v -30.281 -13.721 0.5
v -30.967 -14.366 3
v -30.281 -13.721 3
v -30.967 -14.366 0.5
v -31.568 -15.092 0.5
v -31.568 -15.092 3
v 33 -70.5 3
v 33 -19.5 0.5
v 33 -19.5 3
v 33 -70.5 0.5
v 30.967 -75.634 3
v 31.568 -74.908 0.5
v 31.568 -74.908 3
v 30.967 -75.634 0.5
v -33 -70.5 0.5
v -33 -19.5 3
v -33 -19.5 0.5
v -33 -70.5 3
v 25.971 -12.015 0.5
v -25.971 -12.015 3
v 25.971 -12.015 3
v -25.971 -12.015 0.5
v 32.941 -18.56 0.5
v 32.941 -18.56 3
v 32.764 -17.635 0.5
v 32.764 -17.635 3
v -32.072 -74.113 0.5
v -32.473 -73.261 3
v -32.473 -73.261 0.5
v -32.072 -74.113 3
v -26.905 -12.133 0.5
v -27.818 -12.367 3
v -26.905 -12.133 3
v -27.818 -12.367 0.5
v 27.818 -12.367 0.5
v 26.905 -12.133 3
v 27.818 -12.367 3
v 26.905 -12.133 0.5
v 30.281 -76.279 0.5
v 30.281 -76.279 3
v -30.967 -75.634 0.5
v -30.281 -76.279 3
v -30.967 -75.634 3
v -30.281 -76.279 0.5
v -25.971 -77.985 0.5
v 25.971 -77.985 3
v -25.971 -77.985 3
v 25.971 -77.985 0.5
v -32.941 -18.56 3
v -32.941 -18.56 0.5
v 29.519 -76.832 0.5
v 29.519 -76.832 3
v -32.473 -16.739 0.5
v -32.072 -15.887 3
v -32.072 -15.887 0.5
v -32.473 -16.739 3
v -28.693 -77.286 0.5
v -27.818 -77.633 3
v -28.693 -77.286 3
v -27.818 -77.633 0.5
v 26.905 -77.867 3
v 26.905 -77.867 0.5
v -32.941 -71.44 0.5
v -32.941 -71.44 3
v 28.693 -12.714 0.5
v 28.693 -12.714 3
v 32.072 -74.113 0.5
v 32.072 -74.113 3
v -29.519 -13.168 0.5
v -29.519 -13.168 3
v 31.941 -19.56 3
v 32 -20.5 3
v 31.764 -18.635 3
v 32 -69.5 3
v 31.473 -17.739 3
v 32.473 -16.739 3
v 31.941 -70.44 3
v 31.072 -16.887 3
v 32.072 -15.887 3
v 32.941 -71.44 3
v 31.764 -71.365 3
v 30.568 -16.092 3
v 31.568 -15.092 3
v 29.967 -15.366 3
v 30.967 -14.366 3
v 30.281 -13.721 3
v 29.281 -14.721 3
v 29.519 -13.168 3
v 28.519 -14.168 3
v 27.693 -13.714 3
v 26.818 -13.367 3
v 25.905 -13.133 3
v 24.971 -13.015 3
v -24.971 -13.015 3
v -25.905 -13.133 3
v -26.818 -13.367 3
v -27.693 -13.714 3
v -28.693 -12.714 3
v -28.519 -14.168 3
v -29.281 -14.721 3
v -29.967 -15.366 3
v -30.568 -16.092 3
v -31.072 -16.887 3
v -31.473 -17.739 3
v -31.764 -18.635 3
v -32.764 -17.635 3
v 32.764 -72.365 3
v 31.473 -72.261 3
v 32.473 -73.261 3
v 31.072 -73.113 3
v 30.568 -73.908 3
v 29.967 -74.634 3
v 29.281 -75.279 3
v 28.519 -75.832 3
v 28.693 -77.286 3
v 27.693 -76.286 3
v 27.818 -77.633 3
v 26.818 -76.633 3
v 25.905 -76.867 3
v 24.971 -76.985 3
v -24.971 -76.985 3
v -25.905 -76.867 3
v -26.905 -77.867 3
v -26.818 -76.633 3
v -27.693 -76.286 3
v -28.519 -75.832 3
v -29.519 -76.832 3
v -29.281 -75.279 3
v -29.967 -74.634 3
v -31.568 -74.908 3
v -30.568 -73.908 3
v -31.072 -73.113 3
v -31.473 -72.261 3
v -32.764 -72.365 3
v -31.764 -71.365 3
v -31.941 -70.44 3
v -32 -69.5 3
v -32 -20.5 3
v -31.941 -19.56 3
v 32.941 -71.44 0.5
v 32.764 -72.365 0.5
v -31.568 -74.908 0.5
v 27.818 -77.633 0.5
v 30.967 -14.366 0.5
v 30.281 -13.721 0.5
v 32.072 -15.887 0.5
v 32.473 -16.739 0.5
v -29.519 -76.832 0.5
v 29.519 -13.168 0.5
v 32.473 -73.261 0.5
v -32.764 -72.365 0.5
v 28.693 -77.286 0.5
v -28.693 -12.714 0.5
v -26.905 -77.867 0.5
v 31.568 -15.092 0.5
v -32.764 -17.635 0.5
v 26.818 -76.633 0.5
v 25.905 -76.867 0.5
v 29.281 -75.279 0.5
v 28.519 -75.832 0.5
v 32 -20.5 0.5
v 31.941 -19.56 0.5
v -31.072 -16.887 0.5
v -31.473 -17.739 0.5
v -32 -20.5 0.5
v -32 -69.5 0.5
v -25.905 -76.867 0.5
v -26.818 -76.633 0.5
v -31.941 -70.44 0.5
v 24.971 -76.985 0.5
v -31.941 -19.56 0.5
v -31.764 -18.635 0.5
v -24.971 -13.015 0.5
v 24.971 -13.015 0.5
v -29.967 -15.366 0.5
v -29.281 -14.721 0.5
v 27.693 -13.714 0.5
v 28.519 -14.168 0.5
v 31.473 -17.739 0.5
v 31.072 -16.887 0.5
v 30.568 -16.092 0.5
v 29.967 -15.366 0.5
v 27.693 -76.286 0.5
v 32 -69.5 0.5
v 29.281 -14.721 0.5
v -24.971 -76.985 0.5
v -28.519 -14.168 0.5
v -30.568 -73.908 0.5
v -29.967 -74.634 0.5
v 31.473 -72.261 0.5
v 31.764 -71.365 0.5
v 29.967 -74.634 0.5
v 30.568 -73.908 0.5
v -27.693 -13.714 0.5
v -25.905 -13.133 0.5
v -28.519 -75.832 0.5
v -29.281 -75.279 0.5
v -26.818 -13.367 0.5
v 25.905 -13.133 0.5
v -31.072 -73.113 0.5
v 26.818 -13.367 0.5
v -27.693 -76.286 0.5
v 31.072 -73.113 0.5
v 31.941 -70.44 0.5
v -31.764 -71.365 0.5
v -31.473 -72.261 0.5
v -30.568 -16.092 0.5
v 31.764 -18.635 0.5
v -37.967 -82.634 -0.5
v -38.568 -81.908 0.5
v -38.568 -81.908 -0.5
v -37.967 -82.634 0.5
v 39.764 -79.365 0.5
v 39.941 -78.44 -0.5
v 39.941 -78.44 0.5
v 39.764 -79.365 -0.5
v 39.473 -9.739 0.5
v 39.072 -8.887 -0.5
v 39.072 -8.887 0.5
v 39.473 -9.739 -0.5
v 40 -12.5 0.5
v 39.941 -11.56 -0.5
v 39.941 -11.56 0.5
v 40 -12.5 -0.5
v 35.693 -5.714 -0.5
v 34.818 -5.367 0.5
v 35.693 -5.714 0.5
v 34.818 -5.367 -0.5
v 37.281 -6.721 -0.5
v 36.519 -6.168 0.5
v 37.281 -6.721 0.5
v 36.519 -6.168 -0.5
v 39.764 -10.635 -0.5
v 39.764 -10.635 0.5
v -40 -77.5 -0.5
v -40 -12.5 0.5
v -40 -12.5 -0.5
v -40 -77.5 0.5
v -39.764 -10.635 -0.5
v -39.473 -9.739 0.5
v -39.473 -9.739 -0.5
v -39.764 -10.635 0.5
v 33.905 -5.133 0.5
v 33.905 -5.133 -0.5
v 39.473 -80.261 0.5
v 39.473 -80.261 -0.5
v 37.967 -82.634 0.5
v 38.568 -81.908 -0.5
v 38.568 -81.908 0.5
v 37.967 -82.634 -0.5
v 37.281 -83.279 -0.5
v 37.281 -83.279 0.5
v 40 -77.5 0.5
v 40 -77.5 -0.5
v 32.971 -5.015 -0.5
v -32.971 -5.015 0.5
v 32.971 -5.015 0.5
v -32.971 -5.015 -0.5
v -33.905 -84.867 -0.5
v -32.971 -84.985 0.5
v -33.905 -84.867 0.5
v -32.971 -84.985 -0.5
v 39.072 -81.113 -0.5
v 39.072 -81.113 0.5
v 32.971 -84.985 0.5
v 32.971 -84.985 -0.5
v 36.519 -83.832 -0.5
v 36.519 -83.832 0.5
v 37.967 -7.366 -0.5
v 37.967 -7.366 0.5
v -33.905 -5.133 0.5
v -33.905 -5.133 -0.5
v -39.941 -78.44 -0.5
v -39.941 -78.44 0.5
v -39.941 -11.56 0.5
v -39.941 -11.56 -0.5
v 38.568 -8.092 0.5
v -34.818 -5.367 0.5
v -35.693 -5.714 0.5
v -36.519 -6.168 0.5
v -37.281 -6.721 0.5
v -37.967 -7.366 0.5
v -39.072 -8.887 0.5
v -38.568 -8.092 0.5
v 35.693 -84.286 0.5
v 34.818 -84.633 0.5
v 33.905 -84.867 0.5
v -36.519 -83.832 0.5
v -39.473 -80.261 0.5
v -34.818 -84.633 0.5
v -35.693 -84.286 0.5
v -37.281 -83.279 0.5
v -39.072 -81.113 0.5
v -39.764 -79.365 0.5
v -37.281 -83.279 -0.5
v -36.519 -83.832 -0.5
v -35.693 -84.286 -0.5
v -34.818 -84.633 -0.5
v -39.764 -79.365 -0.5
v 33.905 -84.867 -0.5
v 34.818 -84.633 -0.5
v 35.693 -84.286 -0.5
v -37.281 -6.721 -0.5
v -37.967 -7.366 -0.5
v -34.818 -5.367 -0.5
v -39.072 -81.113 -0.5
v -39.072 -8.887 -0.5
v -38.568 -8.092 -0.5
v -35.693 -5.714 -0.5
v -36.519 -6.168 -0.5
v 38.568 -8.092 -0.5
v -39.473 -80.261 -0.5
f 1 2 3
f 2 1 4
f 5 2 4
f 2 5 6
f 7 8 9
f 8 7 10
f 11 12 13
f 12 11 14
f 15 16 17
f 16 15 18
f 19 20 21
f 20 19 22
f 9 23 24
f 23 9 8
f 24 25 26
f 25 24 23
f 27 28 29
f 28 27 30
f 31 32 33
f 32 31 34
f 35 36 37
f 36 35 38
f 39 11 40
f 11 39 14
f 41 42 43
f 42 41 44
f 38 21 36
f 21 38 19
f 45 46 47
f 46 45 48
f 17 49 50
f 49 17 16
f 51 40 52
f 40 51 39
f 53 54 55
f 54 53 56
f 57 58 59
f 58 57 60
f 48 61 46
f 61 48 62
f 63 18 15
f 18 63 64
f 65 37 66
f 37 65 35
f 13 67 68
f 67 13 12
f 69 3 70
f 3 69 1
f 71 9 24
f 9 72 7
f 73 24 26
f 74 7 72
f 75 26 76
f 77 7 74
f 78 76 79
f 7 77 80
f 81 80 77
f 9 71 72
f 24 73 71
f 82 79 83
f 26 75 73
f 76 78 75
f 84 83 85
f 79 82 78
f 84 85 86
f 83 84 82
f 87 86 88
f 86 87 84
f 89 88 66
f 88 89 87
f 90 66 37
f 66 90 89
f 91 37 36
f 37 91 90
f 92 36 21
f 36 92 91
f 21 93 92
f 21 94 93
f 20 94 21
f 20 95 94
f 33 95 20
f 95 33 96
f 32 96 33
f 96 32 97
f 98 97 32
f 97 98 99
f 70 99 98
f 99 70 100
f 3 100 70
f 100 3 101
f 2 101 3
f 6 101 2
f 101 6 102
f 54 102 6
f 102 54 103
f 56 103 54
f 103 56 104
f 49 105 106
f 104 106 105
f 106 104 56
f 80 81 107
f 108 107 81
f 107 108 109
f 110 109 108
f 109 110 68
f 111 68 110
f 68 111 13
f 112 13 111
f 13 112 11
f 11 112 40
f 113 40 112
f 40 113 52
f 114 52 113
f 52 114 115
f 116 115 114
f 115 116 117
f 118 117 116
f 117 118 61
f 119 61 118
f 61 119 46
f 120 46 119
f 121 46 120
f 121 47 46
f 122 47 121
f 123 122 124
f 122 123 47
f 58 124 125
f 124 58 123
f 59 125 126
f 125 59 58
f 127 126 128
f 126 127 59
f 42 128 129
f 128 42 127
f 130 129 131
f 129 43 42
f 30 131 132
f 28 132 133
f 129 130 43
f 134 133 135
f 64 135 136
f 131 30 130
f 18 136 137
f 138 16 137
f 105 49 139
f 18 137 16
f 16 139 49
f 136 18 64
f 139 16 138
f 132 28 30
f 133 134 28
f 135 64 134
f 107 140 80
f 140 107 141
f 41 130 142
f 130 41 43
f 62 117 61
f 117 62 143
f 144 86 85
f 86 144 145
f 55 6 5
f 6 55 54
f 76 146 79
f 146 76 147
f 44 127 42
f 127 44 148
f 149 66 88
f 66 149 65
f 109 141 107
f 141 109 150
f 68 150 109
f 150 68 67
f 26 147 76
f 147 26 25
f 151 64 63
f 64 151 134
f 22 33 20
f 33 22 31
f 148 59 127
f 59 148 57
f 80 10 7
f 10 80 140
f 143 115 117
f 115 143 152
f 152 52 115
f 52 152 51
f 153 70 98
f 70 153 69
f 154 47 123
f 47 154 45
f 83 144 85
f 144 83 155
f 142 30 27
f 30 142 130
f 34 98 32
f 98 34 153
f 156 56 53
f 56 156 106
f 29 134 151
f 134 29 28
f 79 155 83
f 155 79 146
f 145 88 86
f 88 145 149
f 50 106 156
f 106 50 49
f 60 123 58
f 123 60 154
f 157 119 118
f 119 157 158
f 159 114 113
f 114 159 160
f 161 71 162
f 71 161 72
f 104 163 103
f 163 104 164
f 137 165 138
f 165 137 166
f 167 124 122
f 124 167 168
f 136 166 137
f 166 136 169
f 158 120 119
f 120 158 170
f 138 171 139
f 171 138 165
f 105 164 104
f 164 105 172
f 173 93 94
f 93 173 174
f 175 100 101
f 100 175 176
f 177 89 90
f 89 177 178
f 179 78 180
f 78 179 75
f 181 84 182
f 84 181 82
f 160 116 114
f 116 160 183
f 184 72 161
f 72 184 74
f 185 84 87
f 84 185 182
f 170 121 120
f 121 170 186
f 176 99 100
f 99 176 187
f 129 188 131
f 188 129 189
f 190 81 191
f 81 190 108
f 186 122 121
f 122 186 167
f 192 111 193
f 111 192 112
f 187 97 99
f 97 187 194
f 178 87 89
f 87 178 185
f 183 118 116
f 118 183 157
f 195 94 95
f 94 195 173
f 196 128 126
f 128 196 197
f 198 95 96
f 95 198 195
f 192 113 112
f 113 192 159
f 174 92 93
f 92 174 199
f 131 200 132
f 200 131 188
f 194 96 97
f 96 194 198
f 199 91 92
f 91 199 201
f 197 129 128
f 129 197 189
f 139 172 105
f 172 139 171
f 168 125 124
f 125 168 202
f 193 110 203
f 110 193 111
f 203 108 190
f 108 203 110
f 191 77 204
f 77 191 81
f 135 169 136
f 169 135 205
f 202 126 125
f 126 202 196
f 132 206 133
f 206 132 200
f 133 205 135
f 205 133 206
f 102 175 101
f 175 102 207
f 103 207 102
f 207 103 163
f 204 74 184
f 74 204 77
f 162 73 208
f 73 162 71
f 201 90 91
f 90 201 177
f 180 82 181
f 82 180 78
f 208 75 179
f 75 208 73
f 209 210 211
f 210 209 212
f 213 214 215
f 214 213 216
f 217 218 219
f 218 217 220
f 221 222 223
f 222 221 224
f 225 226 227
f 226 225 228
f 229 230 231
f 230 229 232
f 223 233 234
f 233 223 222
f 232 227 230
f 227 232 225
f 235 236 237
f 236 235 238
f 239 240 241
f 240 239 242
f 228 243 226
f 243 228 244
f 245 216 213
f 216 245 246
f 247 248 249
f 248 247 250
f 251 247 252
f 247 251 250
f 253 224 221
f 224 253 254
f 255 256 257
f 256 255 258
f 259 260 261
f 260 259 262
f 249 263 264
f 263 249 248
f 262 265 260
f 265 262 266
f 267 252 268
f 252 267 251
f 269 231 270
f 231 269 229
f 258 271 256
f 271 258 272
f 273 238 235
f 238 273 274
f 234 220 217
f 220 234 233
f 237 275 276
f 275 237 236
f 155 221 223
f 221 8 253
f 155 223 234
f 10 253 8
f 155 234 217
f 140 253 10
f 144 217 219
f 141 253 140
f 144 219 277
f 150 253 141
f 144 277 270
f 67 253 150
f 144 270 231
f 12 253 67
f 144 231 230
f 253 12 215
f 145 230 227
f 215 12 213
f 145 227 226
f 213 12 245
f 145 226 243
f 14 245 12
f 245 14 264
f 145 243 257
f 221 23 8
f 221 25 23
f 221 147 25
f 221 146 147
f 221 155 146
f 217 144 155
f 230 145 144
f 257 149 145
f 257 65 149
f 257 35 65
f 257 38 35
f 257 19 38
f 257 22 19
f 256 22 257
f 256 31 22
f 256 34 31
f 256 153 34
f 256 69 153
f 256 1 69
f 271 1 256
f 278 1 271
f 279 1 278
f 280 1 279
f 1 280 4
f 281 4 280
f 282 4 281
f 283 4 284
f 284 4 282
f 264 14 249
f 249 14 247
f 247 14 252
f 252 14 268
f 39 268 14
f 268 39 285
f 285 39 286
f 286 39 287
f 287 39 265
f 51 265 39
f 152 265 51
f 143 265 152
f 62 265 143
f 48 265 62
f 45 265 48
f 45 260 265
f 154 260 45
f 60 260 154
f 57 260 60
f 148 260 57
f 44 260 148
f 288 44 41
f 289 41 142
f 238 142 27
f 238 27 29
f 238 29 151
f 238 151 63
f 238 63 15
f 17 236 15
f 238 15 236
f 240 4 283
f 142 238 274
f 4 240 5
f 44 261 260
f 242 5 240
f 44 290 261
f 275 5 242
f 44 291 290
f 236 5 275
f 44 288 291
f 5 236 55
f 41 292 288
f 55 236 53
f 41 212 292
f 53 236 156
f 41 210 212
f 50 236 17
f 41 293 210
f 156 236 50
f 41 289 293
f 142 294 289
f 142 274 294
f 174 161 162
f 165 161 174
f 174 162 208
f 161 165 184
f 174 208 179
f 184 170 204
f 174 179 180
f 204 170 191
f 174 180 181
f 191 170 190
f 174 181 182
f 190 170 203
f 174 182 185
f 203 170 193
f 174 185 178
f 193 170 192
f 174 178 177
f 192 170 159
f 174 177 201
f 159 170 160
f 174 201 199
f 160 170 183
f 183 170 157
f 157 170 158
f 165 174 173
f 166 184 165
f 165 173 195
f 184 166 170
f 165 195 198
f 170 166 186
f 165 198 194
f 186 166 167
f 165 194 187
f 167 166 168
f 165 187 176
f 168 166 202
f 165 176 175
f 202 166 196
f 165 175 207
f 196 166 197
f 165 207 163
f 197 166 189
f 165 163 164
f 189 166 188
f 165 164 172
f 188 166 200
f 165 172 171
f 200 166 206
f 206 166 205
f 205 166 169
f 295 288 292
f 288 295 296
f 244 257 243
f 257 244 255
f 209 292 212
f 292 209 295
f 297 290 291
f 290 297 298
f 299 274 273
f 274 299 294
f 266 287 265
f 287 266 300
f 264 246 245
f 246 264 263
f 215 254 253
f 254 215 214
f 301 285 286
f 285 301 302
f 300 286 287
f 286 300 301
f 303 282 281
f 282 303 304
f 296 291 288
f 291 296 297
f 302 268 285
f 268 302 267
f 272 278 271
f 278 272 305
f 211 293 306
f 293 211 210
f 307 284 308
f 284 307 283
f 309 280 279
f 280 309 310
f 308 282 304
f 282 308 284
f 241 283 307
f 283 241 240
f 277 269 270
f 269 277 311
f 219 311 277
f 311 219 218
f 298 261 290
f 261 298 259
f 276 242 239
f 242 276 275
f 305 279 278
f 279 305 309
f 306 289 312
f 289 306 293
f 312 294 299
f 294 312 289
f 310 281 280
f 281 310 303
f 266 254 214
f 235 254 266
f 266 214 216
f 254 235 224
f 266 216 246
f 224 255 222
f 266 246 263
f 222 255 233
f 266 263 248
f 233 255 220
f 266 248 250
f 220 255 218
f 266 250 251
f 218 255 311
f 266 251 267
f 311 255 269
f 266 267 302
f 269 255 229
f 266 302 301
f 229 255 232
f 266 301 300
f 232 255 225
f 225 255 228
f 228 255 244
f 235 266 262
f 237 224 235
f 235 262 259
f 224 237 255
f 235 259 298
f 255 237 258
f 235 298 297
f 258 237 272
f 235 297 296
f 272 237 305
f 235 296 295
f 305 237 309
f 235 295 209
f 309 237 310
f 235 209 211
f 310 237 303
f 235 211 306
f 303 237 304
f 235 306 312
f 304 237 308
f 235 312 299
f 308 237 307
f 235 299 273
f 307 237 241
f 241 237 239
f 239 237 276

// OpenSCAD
// -*-mode: C; coding: latin-1;-*-
// yrttiviljelma.scad  -  Ritila Yrttiviljelijään
// Copyright (c) 2022 Sampo Kellomaki (sampo@iki.fi), All Rights Reserved.
//
// 20221011 Aloitettu --Sampo
//
// Last Modified: 13:15 Oct 12 2022 sampo
// Version: 1.723
// Edit time: 766 min
//
// - Kaikki mitat millimetreinä (mm), yksi scad yksikkö on yksi millimetri tosielämässä
// - x y z  (leveys, syvyys, korkeys)
//
// Special prefix characters: !show only this, #red, %transparent, *do not show
// union() is the default and often need not be mentioned (except as first item of difference()).

use <libmac.scad>   // ln -s ../lib/libmac.scad
//use <librobo.scad>
//use <ISOThread.scad>   // from https://www.thingiverse.com/thing:311031/comments
//use <MCAD/metric_fastners.scad>  // see /usr/share/openscad/libraries/MCAD/
//use <MCAD/screw.scad>
//use <MCAD/hardware.scad>  // has rot(len, threaded), screw() and nut()
//use <MCAD/screw.scad>
//use <MCAD/nuts_and_bolts.scad>
//use <fonts.scad>
//include <MCAD/fonts.scad>
//include <Arial.scad>

BRIM=1;    // Include support structures for horizontal printing
VBRIM=0;   // Include support structures for vertical printing
LEGEND=0;  // Helpful legends and labels
CID=.4;

D_PIPE=6;
T_PIPE=1.5;

pyoreareika=70;
nelioreuna=70;

$fn=50;
$fs=0.5;     // Make small round objects appear a bit more round
CIDZ=0.4;    // Correction of Inner diameter for holes drilled in Z direction
CIDY=0.4;
CIDX=0.4;
TPIL=0.4;      // Support pillar thickness

module T(x=0,y=0,z=0,rx=0,ry=0,rz=0) { translate([x,y,z]) rotate([rx,ry,rz]) children(0); }

module pyorea_kori() {
  difference() {
    union() {  
      tube(70,1,6);
      T(0,0,30) tube(59,60);
      T(0,0,65) hollow_cone(59,10,10);
      T(0,0,65) symxy(19,19) cyl(3,20);
    }
    for (a=[0:15:180]) {
      T(0,0,16,rz=a) cubint(5,70,20);
      T(0,0,26,ry=90,rz=a) hole(5,70);
      T(0,0,43,rz=a) cubint(5,70,20);
      T(0,0,53,ry=90,rz=a) hole(5,70);
    }
    for (a=[0:26:360]) {
      rz(a) T(12,0,65) cubint(7,2,20);
    }
    for (a=[0:15:360]) {
      rz(a) T(21,0,65) cubint(7,2,20);
    }
  }
}

module pyorea_kartio_kori() {
  difference() {
    union() {  
      tube(pyoreareika + 10,1,6);
      T(0,0,27.75) hollow_cone(pyoreareika - 1,pyoreareika - 5,56.5);
      //T(0,0,65) hollow_cone(55,5,18);  // pohja
      T(0,0,56-0.01) cylinder(h=18,d1=pyoreareika - 5,d2=5);
      T(0,0,55) cylinder(h=1,d=pyoreareika - 5);
      //T(0,0,65.5) symxy(pyoreareika/2 - 13.3,pyoreareika/2 - 13.3) cyl(3.5,19);
      T(0,0,65.5) symxy(pyoreareika/2 - 14.5,pyoreareika/2 - 14.5) cylinder(d1=7,d2=4,h=19,center=true);
    }
    T(0,0,55-0.02) cylinder(h=18.5,d1=pyoreareika - 6.8,d2=2);
    T(0,0,56+10) cylinder(h=10,d=10);
    for (a=[0:15:180]) {
      T(0,0,12,rz=a) cubint(3,70,19);
      T(0,0,21,ry=90,rz=a) hole(3,70);
      T(0,0,37,rz=a) cubint(4,70,19);
      T(0,0,46,ry=90,rz=a) hole(4,70);
    }
    for (a=[0:26:360]) {
      rz(a) T(12,0,61) cubint(7,1.5,20);
    }
    for (a=[5:15:360]) {
      rz(a) T(21,0,61) cubint(7,2,20);
    }
  }
}

module nelio_kartio_kori() {
  difference() {
    union() {  
      sq_tube(nelioreuna+10,nelioreuna+10,1,6,roundness=15);
      T(0,0,0) hull() {
	sq_tube(nelioreuna - 1,nelioreuna - 1,1,roundness=15);
	T(0,0,55) sq_tube(nelioreuna - 5,nelioreuna - 5,1,roundness=15);
	T(0,0,70) sq_tube(5,5,9,roundness=1);
      }
    T(0,0,65) symxy(nelioreuna/2 - 7.2,nelioreuna/2 - 7.2) cylinder(d1=7,d2=4,h=20,center=true);
    }
    T(0,0,-1) hull() {
      sq_tube(nelioreuna - 3,nelioreuna - 3,1,roundness=15);
      T(0,0,55) sq_tube(nelioreuna - 7,nelioreuna - 7,1,roundness=15);
      T(0,0,70) sq_tube(3,3,8,roundness=1);
    }
  for (y=[-21:7:21]) {
      T(0,y,16) cubint(nelioreuna+10,4,20);
      T(0,y,26,ry=90) hole(4,nelioreuna+10);
      T(0,y,40) cubint(nelioreuna+10,4,20);
      T(0,y,50,ry=90) hole(4,nelioreuna+10);
      T(y,0,16,rz=90) cubint(nelioreuna+10,4,20);
      T(y,0,26,ry=90,rz=90) hole(4,nelioreuna+10);
      T(y,0,40,rz=90) cubint(nelioreuna+10,4,20);
      T(y,0,50,ry=90,rz=90) hole(4,nelioreuna+10);
    }
  for (y=[-14:7:14]) {
    T(16+abs(y)/2,y,65) cubint(17-abs(y),2,15);    
    T(-16-abs(y)/2,y,65) cubint(17-abs(y),2,15);    
    T(y,16+abs(y)/2,65) cubint(2,17-abs(y),15);    
    T(y,-16-abs(y)/2,65) cubint(2,17-abs(y),15);    
  }
  hole(7);
}
}

module pyorea_kansi() {
  difference() {
    union() {  
      cyl(pyoreareika + 10,1);
      T(0,0,1) tube(pyoreareika-4,3);
    }
  }
}

module nelio_kansi() {
  difference() {
    union() {  
      cub(nelioreuna + 10,nelioreuna + 10,1,roundness=15);
      T(0,0,1.5) sq_tube(nelioreuna - 4,nelioreuna - 4,3,roundness=15);
    }
  }
}

module ritila() {
  difference() {
    union() {
      cub(460,178,2,roundness=60);
      T(0,0,4) sq_tube(83,172,10,roundness=5);
      T(0,0,4) sq_tube(80,12,10,roundness=5);
      T(0,-nelioreuna/2 + -10,4) sq_tube(nelioreuna+5,nelioreuna + 5,6,roundness=5);
      T(0,nelioreuna/2 + 10,4) sq_tube(nelioreuna+5,nelioreuna + 5,6,roundness=5);
      T(0,0,4) symx(85) union() {
	sq_tube(83,172,10,roundness=5);
	sq_tube(80,12,10,roundness=5);
	T(0,-nelioreuna/2 + -10,0) sq_tube(nelioreuna+5,nelioreuna + 5,6,roundness=5);
	T(0,nelioreuna/2 + 10,0) sq_tube(nelioreuna+5,nelioreuna + 5,6,roundness=5);
      }
      //T(0,0,4) symx(166) sq_tube(75,172,10,roundness=5);
      T(0,0,4) symx(170) union() {
	sq_tube(83,172,10,roundness=5);
	sq_tube(80,12,10,roundness=5);
	T(0,-nelioreuna/2 + -10,0) sq_tube(nelioreuna+5,nelioreuna + 5,6,roundness=5);
	T(0,nelioreuna/2 + 10,0) sq_tube(nelioreuna+5,nelioreuna + 5,6,roundness=5);
      }
      //rulerx(0,240);
    }
    symx(230) cubint(24,51,3);
    T(0,-45,0) cubint(nelioreuna,nelioreuna,3,roundness=15);
    T(0,45,0) hole(pyoreareika,3);
    T(85,45,0) cubint(nelioreuna,nelioreuna,3,roundness=15);
    T(85,-45,0) cubint(nelioreuna,nelioreuna,3,roundness=15);
    T(-85,45,0)  hole(pyoreareika,3);
    T(-85,-45,0)  hole(pyoreareika,3);
    T(0,0,0) symxy(170,45) hole(pyoreareika,3);
  }
}

PRINT=4;   // 0=normal model, 1=parts
XRAY=0;
if (PRINT==1) {
  ritila();
 } else if (PRINT==2) {
  intersection() {
    ritila();
    //cub(85,180,20);  // keski nelio ympyra
    //T(85,0,0) cub(85,180,20); // keski nelio nelio
    //T(-85,0,0) cub(85,180,20);
    T(180,0,0) cub(105,180,20);  // paaty
  }
 } else if (PRINT==3) {
  difference() {
    T(0,45,0) pyorea_kartio_kori();
    if (XRAY) {
      cub(100,100,300);
    }
  }
 } else if (PRINT==4) {
  // T(0,45,0) pyorea_kansi();
  T(0,-45,0) nelio_kansi();
 } else if (PRINT==5) {
  difference() {
    T(0,-45,0) nelio_kartio_kori();
    if (XRAY) {
      cub(90,90,300);
    }
  }
 } else if (PRINT==6) {
  T(0,-45,0) pyorea_kansi();
} else if (PRINT==0) {
  difference() {
    union() {
      ritila();
    }
    if (XRAY) {
      // Y-Z plane cut off for x-ray
      T(101.1,0,140) cub(150,150,300);
      //T(0,50,140) cub(100,100,300);
    }
  }
}

//EOF - yrttiviljelma.scad
